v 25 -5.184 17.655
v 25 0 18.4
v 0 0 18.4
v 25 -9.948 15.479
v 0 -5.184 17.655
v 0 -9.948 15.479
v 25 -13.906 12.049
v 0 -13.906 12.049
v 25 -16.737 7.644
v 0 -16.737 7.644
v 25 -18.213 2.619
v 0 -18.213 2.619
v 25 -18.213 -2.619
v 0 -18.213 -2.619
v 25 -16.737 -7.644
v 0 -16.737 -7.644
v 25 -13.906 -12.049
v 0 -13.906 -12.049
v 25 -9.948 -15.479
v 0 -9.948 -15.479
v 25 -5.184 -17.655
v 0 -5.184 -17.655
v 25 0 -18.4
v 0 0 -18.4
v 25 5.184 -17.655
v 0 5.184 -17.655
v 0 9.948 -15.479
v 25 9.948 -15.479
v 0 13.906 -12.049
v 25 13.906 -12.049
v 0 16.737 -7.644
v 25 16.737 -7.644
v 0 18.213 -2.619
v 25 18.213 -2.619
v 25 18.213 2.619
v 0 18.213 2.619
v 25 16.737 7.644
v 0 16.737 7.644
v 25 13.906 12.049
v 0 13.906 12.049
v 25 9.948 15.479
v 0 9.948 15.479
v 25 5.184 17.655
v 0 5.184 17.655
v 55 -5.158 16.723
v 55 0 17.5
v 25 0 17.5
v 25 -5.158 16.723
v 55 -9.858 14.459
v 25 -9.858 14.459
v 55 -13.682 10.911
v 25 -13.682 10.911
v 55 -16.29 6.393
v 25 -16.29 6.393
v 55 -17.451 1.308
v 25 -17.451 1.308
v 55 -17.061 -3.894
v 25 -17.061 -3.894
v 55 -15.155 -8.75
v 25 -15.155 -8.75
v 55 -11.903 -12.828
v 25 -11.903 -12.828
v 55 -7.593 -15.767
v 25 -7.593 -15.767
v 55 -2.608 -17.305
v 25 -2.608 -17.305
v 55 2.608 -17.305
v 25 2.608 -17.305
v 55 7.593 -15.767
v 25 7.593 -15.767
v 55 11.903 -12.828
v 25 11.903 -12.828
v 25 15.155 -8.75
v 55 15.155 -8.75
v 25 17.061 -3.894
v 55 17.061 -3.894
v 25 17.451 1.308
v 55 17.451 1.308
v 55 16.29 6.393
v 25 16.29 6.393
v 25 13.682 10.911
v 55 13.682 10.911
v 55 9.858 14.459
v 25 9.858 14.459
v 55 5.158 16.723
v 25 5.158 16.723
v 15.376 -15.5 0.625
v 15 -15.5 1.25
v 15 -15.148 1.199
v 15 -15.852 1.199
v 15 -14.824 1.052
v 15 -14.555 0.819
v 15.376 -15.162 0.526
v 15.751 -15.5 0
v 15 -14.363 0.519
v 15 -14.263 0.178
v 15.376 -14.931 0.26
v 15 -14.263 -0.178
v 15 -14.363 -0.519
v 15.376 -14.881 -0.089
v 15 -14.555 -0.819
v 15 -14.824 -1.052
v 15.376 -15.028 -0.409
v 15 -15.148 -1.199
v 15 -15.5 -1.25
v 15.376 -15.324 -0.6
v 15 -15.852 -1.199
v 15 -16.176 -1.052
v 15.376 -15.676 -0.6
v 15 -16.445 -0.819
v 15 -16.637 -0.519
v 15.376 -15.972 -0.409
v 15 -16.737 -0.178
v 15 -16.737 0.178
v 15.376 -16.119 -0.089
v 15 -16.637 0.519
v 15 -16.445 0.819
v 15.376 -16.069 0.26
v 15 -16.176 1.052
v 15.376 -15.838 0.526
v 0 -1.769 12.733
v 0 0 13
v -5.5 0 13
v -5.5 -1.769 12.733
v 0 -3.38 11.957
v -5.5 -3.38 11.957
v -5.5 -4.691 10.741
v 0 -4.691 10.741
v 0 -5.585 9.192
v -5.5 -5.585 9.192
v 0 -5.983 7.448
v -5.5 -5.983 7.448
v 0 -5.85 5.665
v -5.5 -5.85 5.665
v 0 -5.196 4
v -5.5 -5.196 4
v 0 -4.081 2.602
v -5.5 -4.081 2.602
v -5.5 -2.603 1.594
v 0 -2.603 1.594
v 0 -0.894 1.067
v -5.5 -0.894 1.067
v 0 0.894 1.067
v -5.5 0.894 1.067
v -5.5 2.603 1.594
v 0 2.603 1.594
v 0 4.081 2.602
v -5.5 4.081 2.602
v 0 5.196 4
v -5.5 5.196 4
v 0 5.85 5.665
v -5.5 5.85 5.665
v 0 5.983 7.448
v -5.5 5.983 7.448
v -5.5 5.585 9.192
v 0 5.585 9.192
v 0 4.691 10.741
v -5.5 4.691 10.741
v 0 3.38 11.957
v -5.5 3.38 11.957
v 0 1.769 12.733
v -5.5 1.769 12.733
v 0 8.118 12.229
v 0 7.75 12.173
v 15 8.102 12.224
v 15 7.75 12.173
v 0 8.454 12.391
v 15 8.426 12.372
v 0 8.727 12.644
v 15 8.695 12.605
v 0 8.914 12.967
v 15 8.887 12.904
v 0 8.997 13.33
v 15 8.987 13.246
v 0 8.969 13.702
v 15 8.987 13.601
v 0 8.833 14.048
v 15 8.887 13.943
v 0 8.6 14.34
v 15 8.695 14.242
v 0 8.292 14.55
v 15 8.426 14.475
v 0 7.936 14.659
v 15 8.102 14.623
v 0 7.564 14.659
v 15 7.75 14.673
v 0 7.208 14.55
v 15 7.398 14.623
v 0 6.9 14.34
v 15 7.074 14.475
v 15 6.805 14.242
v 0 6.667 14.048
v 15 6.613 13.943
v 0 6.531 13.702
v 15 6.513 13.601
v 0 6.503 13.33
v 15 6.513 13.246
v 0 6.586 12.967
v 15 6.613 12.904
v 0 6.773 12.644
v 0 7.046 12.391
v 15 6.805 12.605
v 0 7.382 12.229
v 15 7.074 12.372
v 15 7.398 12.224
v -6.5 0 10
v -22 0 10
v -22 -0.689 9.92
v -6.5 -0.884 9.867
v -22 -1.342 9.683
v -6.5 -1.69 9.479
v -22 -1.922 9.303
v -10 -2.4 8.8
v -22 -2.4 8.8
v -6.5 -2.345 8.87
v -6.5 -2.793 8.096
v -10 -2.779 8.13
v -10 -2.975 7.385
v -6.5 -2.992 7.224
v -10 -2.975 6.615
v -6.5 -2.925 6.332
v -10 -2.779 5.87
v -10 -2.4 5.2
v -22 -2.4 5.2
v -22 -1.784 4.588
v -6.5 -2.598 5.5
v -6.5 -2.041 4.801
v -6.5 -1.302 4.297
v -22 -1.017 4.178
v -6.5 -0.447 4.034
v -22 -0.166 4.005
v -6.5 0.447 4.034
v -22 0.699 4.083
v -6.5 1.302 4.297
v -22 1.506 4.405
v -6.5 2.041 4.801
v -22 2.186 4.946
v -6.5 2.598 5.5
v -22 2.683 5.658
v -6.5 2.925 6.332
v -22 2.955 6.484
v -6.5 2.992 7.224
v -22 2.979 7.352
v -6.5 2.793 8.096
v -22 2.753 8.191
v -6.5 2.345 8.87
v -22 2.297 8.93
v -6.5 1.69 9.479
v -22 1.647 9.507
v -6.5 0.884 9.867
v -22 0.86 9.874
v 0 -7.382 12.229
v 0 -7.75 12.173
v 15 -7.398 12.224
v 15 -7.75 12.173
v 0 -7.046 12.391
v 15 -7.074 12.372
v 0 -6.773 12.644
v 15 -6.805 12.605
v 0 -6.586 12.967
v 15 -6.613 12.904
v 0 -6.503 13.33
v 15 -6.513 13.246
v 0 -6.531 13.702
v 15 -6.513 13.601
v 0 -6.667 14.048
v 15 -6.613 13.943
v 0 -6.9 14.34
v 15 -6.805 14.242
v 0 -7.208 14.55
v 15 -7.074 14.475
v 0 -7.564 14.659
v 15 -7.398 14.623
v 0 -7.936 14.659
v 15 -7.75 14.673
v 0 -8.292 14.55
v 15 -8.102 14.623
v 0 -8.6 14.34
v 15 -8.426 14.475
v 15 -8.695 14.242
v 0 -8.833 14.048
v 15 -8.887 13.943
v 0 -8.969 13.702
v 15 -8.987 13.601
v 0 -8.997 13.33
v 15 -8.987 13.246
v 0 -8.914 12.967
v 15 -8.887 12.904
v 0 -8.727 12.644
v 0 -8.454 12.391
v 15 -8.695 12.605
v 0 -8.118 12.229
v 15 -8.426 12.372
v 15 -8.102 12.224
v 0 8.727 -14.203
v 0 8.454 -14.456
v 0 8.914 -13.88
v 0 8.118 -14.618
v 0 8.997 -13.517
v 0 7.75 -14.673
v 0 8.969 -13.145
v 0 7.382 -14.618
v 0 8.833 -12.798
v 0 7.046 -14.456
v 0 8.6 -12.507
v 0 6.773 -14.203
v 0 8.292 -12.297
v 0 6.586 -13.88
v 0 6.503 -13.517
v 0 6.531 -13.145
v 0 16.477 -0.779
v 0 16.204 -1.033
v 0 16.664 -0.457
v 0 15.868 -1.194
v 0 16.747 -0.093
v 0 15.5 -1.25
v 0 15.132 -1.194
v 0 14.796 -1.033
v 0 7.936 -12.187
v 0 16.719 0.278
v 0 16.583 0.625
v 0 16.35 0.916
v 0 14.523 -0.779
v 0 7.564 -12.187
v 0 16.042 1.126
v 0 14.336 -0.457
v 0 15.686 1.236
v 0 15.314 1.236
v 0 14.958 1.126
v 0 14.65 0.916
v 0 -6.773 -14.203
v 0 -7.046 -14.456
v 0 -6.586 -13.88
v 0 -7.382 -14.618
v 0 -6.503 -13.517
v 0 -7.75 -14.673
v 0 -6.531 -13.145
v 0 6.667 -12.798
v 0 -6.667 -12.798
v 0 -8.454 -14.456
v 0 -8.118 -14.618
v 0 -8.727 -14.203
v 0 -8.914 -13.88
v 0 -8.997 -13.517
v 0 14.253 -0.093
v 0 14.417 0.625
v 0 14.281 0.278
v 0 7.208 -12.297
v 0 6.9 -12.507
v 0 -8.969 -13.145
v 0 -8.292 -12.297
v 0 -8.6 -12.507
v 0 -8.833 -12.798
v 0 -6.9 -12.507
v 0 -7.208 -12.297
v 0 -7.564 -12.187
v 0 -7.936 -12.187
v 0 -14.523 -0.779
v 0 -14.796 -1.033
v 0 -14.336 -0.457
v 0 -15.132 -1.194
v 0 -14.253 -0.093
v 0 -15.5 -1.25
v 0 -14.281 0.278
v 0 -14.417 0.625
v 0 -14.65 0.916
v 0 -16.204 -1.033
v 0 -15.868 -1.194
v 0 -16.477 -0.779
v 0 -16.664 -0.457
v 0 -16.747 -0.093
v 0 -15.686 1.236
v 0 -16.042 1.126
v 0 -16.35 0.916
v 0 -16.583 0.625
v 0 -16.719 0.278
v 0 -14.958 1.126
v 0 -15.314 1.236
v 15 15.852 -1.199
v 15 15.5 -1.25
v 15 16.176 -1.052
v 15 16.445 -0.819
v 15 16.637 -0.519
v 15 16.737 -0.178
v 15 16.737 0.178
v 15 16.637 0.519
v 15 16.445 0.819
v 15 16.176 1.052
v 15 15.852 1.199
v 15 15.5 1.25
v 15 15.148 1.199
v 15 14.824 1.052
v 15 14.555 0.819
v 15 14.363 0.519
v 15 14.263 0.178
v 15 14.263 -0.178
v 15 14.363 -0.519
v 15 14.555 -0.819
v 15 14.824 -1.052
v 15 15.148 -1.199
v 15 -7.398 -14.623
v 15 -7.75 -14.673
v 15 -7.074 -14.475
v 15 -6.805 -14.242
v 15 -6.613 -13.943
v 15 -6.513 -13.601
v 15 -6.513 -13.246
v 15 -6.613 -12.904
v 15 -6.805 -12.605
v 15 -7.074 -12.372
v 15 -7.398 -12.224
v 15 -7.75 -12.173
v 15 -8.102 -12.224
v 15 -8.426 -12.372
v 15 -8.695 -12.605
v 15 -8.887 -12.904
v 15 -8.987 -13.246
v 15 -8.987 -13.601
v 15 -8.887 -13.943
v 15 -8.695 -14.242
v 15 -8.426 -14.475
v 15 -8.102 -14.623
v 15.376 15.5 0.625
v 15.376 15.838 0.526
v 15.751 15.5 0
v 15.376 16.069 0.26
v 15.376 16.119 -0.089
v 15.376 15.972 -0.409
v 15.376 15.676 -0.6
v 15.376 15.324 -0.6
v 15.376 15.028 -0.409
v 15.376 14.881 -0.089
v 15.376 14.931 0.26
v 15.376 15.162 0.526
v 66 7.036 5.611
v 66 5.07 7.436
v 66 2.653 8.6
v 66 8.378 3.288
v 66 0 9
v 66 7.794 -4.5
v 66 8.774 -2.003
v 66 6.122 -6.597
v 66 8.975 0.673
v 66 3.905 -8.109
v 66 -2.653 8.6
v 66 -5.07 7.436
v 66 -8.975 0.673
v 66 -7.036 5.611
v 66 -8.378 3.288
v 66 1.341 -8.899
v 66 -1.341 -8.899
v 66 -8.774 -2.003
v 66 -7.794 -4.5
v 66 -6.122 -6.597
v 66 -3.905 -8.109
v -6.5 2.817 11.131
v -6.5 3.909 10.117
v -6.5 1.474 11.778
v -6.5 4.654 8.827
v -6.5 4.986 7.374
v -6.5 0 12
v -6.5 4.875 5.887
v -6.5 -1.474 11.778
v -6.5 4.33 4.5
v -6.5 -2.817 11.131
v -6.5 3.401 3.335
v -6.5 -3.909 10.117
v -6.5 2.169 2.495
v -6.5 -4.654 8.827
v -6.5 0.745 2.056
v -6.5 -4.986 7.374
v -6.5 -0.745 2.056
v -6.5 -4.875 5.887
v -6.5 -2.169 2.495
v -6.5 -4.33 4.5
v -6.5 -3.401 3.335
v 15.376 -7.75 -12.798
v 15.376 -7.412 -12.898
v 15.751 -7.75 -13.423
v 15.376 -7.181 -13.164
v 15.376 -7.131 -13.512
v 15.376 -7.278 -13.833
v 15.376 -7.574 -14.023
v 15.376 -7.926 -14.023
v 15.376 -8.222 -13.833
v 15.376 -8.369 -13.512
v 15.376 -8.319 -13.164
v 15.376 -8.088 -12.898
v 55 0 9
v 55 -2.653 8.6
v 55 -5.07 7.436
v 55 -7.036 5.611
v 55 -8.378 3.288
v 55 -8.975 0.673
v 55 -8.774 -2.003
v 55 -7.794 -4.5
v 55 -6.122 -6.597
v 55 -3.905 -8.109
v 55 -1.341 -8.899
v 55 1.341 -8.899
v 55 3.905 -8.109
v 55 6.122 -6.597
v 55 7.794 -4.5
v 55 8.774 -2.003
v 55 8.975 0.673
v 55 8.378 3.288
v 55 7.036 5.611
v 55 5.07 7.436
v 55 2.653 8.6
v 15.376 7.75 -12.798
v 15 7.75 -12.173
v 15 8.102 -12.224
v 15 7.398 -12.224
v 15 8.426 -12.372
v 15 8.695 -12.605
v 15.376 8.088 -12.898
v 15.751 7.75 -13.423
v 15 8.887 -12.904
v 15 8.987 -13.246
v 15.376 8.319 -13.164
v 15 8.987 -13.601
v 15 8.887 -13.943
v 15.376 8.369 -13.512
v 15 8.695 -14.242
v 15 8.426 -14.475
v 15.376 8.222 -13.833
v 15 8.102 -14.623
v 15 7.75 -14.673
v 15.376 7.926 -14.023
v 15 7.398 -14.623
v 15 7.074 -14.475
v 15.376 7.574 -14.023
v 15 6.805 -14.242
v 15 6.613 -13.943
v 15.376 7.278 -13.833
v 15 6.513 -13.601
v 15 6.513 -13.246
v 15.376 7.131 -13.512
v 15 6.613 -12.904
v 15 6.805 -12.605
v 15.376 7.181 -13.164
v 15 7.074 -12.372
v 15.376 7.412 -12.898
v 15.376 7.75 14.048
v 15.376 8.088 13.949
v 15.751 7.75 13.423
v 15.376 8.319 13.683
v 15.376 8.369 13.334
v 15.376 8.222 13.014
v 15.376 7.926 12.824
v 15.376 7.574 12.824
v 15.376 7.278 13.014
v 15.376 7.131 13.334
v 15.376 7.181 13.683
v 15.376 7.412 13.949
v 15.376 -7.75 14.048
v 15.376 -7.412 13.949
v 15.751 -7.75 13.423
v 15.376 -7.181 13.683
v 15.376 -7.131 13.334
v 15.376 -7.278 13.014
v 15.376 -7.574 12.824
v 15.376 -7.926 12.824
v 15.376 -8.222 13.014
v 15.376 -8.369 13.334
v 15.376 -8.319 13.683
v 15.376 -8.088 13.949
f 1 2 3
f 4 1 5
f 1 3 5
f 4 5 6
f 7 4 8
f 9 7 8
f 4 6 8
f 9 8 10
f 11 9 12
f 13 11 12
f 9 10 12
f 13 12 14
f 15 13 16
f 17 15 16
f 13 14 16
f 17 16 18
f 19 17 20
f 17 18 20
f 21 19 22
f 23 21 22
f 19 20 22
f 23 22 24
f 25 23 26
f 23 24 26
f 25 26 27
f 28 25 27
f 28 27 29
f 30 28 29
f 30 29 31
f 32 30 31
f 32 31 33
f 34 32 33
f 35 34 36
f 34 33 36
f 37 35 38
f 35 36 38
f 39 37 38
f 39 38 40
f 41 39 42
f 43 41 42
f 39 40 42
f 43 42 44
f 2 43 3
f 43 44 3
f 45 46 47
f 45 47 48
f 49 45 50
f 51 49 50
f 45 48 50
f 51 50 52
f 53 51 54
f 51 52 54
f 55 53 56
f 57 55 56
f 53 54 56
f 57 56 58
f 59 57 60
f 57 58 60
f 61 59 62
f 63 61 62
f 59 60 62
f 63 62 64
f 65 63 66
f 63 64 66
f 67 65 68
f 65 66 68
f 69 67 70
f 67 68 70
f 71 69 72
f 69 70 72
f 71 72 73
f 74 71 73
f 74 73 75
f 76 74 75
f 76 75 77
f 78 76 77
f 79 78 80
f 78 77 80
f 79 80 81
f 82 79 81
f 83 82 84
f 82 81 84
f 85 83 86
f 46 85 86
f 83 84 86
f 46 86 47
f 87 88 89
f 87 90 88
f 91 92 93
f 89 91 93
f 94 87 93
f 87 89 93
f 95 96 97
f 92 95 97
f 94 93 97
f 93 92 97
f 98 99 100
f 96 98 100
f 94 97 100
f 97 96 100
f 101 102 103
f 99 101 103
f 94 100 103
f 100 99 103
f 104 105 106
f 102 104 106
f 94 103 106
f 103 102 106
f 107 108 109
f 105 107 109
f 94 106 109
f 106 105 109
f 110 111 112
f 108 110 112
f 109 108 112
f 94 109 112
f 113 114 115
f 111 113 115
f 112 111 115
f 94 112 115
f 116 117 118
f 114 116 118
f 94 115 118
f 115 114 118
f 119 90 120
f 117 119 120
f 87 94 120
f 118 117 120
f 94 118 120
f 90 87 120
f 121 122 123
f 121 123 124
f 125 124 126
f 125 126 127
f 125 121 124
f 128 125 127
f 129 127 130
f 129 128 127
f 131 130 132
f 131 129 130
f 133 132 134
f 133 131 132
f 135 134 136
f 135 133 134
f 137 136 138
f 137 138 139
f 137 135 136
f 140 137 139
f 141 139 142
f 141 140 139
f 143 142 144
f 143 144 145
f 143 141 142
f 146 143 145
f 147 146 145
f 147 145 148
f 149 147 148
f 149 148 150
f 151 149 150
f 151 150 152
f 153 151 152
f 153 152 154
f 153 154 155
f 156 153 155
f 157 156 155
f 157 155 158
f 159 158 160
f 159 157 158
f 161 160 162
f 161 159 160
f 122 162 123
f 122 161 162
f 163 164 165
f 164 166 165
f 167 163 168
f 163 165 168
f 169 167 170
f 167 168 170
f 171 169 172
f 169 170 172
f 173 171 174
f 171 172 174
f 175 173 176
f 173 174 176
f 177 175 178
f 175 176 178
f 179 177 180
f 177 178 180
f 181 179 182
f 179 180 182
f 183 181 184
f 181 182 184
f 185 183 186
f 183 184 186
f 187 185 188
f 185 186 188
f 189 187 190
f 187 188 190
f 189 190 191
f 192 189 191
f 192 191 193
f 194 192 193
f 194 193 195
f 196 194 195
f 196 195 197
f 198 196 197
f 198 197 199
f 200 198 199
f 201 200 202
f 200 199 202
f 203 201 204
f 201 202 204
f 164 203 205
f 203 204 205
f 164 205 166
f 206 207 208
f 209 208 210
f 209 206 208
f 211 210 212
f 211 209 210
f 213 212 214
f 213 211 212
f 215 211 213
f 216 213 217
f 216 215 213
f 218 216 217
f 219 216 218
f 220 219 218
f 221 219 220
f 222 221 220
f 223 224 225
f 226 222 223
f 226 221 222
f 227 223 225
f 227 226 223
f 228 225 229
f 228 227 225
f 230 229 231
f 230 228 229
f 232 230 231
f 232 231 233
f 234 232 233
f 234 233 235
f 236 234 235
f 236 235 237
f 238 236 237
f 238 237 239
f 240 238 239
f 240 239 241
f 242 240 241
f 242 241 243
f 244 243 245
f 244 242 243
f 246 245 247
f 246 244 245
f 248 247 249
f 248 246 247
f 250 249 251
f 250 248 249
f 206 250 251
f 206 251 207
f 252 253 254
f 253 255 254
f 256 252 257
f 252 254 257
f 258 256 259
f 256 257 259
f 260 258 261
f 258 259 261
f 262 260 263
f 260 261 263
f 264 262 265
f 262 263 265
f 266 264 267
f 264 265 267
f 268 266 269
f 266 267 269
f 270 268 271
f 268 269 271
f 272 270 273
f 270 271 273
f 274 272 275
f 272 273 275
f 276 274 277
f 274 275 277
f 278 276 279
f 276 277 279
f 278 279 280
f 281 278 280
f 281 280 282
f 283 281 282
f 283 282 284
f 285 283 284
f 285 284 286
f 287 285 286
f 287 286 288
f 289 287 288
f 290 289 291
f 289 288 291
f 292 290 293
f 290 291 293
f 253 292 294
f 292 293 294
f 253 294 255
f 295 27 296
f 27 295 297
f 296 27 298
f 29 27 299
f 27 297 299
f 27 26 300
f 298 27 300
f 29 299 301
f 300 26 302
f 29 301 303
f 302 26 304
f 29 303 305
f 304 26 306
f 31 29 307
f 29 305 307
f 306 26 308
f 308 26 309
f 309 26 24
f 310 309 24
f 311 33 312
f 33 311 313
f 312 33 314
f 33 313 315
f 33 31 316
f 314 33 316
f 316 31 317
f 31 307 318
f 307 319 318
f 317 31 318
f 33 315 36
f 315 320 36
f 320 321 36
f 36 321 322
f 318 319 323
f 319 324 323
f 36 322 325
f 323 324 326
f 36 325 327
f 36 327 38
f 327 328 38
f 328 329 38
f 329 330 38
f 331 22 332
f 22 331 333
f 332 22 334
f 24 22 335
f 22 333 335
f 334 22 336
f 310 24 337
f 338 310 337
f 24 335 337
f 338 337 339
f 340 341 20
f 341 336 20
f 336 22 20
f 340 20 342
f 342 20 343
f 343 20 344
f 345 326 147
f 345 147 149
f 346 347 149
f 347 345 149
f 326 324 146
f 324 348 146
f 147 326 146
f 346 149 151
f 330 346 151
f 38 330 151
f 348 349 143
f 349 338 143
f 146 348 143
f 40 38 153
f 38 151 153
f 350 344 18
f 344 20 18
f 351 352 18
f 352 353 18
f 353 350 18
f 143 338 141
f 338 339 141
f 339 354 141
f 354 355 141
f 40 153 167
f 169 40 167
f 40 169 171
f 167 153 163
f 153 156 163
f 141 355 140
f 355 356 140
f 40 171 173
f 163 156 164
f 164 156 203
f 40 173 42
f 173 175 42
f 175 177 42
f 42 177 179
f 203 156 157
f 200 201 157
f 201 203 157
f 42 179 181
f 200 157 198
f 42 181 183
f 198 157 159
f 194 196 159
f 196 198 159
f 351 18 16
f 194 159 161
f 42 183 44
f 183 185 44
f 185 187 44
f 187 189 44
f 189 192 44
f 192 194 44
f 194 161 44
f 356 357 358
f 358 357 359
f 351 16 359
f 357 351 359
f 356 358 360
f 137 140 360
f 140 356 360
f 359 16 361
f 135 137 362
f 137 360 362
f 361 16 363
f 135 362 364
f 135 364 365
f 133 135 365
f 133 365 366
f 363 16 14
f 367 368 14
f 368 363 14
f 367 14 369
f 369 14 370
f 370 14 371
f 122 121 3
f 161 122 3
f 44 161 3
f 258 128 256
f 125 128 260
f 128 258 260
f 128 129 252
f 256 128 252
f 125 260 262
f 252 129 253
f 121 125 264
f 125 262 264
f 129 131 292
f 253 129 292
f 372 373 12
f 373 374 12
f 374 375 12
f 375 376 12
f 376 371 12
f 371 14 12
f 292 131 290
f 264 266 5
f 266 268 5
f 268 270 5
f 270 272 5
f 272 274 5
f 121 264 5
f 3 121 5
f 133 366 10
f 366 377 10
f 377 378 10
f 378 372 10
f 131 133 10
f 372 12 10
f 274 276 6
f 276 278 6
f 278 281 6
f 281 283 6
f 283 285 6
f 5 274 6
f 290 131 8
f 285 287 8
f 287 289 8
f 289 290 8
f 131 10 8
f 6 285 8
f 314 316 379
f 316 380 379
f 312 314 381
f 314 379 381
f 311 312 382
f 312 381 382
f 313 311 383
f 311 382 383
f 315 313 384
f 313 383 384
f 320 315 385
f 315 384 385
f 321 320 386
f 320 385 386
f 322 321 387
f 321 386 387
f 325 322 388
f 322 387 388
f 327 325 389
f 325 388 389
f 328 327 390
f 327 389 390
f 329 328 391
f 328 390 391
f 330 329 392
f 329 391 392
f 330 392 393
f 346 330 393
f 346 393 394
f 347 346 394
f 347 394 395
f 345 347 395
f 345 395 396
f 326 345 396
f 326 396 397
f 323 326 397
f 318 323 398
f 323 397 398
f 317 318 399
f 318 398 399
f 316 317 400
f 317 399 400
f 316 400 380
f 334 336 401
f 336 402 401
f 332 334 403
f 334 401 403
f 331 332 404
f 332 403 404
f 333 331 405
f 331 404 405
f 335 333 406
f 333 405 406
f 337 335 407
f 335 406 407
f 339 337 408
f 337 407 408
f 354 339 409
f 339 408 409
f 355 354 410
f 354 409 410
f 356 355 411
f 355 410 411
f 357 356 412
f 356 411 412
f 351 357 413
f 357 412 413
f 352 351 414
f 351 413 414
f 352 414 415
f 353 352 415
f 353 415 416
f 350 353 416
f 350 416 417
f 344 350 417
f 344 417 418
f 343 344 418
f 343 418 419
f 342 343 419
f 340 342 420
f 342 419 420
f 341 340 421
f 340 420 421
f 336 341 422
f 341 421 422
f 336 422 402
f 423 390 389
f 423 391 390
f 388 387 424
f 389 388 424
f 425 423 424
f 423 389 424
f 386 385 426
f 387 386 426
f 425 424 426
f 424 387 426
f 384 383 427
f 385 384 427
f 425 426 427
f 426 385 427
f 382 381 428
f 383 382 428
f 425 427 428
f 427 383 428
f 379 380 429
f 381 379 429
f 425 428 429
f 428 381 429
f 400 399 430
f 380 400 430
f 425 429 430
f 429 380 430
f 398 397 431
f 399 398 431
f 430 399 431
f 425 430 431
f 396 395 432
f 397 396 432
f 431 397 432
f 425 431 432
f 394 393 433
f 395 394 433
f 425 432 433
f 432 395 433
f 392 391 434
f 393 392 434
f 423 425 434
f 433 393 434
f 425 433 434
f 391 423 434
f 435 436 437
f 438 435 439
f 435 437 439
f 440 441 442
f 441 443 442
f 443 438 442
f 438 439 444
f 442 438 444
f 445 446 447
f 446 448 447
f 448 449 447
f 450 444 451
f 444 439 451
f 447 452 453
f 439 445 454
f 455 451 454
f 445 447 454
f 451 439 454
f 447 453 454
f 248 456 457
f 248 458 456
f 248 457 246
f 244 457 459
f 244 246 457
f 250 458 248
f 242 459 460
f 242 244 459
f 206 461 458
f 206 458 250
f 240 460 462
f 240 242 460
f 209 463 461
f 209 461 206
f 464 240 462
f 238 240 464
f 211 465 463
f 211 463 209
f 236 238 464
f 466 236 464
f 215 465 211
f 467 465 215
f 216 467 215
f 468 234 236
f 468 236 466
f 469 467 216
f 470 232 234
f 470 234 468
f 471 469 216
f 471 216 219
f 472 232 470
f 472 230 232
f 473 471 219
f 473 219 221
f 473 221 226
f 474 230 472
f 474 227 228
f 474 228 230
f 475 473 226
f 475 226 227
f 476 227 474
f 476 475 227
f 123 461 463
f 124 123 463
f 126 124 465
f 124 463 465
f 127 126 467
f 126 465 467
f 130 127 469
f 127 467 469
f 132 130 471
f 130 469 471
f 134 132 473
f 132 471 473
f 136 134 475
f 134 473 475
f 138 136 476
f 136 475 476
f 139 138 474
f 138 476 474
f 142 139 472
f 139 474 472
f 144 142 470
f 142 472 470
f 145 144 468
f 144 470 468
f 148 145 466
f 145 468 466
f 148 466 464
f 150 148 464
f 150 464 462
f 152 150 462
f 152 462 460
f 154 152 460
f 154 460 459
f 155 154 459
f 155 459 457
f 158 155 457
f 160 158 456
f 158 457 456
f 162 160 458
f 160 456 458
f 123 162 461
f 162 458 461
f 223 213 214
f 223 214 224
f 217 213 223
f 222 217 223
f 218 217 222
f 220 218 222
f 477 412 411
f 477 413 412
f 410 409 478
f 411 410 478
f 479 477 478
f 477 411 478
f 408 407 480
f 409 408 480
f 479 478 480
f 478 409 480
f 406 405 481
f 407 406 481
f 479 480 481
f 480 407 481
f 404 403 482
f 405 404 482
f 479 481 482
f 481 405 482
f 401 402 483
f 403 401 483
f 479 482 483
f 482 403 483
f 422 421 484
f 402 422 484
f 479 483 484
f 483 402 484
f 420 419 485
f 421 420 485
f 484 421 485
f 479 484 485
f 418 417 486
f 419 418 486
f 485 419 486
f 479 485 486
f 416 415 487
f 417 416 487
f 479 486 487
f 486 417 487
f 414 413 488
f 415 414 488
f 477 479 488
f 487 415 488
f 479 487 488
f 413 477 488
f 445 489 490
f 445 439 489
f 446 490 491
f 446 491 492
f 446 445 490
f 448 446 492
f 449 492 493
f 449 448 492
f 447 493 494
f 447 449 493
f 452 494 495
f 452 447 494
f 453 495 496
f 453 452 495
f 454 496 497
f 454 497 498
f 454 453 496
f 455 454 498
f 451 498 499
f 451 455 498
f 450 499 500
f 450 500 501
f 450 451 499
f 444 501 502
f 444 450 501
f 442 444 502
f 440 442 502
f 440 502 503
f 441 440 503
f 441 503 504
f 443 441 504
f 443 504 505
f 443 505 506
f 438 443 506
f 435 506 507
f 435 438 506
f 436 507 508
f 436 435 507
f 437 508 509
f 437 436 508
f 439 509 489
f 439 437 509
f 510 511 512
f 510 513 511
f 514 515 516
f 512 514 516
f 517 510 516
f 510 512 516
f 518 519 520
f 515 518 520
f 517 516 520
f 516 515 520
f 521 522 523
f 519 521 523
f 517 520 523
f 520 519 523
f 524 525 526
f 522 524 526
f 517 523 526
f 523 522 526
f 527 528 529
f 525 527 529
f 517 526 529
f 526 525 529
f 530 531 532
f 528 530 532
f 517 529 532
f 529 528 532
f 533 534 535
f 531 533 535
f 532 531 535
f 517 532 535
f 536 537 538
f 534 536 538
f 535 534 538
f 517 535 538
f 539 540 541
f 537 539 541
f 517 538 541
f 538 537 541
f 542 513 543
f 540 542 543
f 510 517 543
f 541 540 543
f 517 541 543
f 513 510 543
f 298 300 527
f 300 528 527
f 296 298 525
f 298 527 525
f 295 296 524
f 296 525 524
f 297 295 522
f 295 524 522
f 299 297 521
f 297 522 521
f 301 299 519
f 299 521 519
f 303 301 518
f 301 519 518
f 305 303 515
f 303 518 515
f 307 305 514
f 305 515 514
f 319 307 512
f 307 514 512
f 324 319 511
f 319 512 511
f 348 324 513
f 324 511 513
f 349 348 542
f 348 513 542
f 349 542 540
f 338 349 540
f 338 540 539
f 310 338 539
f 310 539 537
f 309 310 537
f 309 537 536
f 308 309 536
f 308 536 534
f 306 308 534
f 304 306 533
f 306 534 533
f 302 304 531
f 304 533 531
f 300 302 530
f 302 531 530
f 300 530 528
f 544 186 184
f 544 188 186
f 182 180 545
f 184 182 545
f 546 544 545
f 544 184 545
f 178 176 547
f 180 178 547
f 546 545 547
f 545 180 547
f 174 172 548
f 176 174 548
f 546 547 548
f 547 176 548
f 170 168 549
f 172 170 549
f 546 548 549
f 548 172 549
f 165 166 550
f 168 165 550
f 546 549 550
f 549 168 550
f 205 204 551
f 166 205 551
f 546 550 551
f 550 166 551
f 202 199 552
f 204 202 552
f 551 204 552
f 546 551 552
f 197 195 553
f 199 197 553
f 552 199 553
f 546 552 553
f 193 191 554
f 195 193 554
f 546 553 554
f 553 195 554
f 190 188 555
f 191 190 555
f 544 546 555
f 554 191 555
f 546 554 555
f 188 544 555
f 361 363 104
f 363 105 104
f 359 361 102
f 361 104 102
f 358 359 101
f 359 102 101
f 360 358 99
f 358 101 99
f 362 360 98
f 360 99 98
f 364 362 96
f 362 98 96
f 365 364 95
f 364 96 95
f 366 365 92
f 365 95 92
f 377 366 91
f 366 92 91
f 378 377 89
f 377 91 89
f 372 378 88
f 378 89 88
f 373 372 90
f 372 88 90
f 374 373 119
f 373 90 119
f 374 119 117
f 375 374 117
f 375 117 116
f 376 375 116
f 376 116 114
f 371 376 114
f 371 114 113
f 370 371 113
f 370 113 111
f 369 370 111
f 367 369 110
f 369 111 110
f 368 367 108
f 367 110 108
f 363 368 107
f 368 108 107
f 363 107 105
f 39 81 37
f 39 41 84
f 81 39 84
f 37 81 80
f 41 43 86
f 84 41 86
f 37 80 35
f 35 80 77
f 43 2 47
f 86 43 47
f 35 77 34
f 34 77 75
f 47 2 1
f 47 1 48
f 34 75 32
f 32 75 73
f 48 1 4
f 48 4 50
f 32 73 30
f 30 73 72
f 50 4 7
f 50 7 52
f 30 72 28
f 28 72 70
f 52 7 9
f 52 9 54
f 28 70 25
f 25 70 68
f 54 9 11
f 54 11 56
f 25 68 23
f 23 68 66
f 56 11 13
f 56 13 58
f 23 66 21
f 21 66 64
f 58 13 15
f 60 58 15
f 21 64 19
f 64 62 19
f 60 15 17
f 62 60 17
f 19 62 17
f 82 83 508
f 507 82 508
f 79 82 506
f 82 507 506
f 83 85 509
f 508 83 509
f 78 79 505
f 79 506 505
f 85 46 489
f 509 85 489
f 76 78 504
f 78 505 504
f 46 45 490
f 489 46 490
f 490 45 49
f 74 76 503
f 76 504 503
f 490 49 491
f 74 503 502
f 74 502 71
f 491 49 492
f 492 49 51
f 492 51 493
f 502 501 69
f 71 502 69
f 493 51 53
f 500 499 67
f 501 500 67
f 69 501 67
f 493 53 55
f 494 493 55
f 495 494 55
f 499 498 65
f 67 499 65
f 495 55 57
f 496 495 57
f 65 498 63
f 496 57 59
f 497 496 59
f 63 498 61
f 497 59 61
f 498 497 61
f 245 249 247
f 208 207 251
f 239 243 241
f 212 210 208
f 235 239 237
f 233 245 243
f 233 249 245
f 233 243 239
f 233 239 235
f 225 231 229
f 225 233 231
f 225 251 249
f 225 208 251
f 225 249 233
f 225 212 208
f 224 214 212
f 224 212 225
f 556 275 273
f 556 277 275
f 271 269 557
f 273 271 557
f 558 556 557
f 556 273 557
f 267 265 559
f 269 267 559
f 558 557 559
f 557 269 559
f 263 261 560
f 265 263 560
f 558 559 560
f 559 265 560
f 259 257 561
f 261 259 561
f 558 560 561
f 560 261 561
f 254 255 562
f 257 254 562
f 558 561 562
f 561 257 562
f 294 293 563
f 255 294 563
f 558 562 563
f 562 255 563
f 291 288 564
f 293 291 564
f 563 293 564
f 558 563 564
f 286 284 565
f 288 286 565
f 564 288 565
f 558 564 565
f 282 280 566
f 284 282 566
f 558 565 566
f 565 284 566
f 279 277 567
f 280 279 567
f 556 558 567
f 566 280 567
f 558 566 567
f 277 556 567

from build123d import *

# Parameters (mm, degrees)
ESQUISSE3_W                                   = 15.5
ESQUISSE3_H                                   = 3
ESQUISSE3_W_2                                 = 6.5
ESQUISSE3_H_2                                 = 6
CHANFREIN1_SIZE                               = 1
ENL_V_MAT_EXTRU_1_DEPTH                       = 82.278041315
ENL_V_MAT_EXTRU_1_DEPTH_BACK                  = 12
TROU_POUR_TARAUDAGE_POUR_TROU_TARAUD_M3_D     = 2.5
TROU_POUR_TARAUDAGE_POUR_TROU_TARAUD_M3_DEPTH = 15
TROU_POUR_TARAUDAGE_POUR_TROU_TARAUD_M3_TIP   = 0.751075774
ESQUISSE9_W                                   = 11
ESQUISSE9_H                                   = 9


with BuildPart() as part:
    # Esquisse1 → Révolution10 (revolve)
    with BuildSketch(Plane.XY, mode=Mode.PRIVATE) as r_volution10_sk:
        Polygon((0, 6), (0, 0), (12.5, 0), (55, 0), (55, 17.5), (25, 17.5), (25, 18.4), (0, 18.4), align=None)
    revolve(r_volution10_sk.sketch.rotate(Axis((12.5, 0, 0), (1, 0, 0)), 90), axis=Axis((12.5, 0, 0), (1, 0, 0)))

    # Esquisse3 → Révolution12 (revolve)
    with BuildSketch(Plane.XY.offset(7), mode=Mode.PRIVATE) as r_volution12_sk:
        with Locations((-14.25, 1.5)):
            Rectangle(ESQUISSE3_W, ESQUISSE3_H)
        with Locations((-3.25, 3)):
            Rectangle(ESQUISSE3_W_2, ESQUISSE3_H_2)
    revolve(r_volution12_sk.sketch.rotate(Axis((0, 0, 7), (1, 0, 0)), 90), axis=Axis((0, 0, 7), (1, 0, 0)))

    # Chanfrein1
    chanfrein1_edges = [part.edges().sort_by_distance(p)[0] for p in [
        (-6.5, 0, 1),
    ]]
    chamfer(chanfrein1_edges, length=CHANFREIN1_SIZE)

    # Esquisse4 → Enlèv. mat.-Extru.1 (cut, two sides: drawn at the far end of the back side and taken through both)
    with BuildSketch(Plane.ZY.offset(22).offset(-ENL_V_MAT_EXTRU_1_DEPTH_BACK)):
        Polygon((-73.282990589, -2.4), (5.2, -2.4), (8.8, -2.4), (87.282990589, -2.4), (87.282990589, -159.365981178), (-73.282990589, -159.365981178), align=None)
    extrude(amount=ENL_V_MAT_EXTRU_1_DEPTH + ENL_V_MAT_EXTRU_1_DEPTH_BACK, mode=Mode.SUBTRACT)

    # Trou pour taraudage pour trou taraudé M3x0.51
    with Locations(Plane.ZY):
        with Locations((0, 15.5), (-13.423393759, -7.75), (0, -15.5), (13.423393759, -7.75), (13.423393759, 7.75), (-13.423393759, 7.75)):
            Hole(TROU_POUR_TARAUDAGE_POUR_TROU_TARAUD_M3_D / 2, depth=TROU_POUR_TARAUDAGE_POUR_TROU_TARAUD_M3_DEPTH)
            with Locations((0, 0, -(TROU_POUR_TARAUDAGE_POUR_TROU_TARAUD_M3_DEPTH + TROU_POUR_TARAUDAGE_POUR_TROU_TARAUD_M3_TIP / 2))):  # 118° drill point
                Cone(0, TROU_POUR_TARAUDAGE_POUR_TROU_TARAUD_M3_D / 2, TROU_POUR_TARAUDAGE_POUR_TROU_TARAUD_M3_TIP, mode=Mode.SUBTRACT)

    # Esquisse9 → Révolution13 (revolve)
    with BuildSketch(Plane.XY, mode=Mode.PRIVATE) as r_volution13_sk:
        with Locations((60.5, 4.5)):
            Rectangle(ESQUISSE9_W, ESQUISSE9_H)
    revolve(r_volution13_sk.sketch.rotate(Axis((0, 0, 0), (1, 0, 0)), 90), axis=Axis((0, 0, 0), (1, 0, 0)))


solid = part.part
